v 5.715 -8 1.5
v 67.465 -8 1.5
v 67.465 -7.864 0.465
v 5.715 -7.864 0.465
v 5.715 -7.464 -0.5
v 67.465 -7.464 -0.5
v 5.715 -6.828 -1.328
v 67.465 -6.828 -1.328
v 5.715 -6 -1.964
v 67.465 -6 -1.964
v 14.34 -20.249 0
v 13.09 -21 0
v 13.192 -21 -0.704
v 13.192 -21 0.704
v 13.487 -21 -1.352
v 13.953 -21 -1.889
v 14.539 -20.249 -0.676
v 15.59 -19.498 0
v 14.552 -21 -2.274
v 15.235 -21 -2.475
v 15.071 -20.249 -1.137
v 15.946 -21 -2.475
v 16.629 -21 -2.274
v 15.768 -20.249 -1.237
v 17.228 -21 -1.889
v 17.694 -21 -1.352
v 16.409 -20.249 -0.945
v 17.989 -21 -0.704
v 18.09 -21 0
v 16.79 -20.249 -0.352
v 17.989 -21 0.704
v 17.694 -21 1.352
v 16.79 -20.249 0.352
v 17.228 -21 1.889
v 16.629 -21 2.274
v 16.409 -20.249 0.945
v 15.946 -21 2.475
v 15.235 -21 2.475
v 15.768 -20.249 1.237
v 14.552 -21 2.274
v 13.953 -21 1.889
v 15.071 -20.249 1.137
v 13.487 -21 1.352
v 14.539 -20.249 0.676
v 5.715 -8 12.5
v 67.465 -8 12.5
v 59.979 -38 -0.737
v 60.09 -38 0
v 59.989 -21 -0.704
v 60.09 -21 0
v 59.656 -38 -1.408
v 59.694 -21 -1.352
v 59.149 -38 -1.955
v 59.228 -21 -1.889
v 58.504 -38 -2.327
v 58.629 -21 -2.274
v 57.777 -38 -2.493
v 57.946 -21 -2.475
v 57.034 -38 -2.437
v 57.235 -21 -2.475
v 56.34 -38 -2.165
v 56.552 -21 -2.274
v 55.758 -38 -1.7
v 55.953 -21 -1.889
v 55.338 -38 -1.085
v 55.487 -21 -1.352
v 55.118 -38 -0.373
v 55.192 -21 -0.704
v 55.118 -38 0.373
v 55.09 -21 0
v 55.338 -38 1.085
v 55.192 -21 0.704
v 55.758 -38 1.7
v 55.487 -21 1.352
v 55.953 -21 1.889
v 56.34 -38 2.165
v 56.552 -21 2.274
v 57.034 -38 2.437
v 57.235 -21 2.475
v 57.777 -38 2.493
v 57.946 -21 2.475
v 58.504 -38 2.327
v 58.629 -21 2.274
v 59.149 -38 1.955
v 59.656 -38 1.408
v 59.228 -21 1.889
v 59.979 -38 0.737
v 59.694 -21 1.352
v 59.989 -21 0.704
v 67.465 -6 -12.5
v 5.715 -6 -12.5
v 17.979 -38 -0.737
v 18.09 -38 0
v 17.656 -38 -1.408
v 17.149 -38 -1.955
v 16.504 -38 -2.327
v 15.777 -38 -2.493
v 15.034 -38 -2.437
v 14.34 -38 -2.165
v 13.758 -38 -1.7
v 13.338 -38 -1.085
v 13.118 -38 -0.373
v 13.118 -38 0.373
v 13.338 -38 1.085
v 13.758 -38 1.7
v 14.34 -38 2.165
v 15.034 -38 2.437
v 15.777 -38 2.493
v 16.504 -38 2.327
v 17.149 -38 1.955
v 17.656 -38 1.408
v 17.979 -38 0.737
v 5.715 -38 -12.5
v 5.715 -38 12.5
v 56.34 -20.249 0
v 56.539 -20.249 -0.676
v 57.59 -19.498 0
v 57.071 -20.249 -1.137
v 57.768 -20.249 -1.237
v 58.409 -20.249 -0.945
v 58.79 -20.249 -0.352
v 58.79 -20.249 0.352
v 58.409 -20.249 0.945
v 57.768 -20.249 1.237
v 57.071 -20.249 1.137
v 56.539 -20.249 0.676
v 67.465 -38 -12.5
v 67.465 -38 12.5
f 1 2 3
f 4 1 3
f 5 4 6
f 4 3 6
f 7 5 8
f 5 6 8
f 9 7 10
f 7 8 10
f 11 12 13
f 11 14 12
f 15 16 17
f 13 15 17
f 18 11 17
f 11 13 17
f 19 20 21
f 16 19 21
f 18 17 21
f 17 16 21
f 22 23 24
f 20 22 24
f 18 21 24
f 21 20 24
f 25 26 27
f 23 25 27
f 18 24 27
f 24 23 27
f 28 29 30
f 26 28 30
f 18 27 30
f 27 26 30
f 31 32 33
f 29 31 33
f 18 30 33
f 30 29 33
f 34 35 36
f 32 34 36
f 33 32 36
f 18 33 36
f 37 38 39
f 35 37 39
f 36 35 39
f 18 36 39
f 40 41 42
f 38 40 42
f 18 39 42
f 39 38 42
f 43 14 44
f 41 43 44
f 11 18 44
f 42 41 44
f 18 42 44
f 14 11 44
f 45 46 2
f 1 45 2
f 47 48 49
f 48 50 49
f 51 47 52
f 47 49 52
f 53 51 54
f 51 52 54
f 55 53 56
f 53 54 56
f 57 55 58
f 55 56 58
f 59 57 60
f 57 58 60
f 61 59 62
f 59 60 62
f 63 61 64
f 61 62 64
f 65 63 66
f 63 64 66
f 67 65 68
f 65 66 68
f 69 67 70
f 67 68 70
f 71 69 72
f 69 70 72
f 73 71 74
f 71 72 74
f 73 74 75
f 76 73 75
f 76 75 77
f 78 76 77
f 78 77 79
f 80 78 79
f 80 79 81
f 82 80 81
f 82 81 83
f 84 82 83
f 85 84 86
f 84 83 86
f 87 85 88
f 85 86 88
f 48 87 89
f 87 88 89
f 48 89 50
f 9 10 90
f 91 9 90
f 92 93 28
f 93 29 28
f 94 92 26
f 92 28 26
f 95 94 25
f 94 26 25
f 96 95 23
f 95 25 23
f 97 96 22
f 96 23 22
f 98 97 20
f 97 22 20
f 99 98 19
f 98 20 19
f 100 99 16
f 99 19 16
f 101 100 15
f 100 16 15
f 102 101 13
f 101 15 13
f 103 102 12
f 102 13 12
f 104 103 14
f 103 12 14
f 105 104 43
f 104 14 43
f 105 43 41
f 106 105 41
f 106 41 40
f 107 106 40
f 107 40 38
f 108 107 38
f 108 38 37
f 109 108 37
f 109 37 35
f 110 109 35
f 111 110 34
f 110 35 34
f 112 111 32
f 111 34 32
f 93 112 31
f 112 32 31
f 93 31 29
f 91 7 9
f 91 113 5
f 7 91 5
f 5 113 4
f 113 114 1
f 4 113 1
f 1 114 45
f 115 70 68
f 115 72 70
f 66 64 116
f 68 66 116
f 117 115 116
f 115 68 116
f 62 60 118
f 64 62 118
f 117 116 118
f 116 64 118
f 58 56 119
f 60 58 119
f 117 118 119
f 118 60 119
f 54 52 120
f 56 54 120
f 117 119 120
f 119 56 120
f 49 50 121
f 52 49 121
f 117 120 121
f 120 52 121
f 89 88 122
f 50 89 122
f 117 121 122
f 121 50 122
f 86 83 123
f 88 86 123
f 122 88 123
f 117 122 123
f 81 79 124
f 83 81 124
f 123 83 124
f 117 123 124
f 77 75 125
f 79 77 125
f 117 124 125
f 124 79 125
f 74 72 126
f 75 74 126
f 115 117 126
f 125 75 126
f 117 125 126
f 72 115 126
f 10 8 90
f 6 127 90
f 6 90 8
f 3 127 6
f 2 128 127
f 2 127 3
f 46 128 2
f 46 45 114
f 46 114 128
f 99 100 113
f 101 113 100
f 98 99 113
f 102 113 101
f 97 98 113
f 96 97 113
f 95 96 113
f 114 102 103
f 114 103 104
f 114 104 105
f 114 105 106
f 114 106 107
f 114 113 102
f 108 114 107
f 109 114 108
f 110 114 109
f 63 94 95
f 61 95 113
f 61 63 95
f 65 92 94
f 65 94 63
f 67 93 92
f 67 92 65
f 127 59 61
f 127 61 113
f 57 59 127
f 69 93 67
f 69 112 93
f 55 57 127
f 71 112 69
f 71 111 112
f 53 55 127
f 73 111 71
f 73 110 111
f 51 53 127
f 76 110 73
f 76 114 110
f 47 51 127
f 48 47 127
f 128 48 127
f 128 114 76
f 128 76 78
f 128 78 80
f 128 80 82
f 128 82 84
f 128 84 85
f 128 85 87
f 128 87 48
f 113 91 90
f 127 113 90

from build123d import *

# Parameters (mm, degrees)
SKETCH1_W             = 61.75
SKETCH1_H             = 38
BOSS_EXTRUDE1_DEPTH   = 12.5
CUT_EXTRUDE1_REACH    = 75.575
M6_TAPPED_HOLE1_D     = 5
M6_TAPPED_HOLE1_DEPTH = 17
M6_TAPPED_HOLE1_TIP   = 1.502151548


with BuildPart() as part:
    # Sketch1 → Boss-Extrude1 (new, symmetric)
    with BuildSketch(Plane.XY):
        with Locations((36.590437788, -19)):
            Rectangle(SKETCH1_W, SKETCH1_H)
    extrude(amount=BOSS_EXTRUDE1_DEPTH, both=True)

    # Sketch2 → Cut-Extrude1 (cut, up to next)
    with BuildSketch(Plane(origin=(67.465437788, 0, 0), x_dir=(0, 0, -1), z_dir=(1, 0, 0)), mode=Mode.PRIVATE) as cut_extrude1_sk1:
        with BuildLine():
            Line((1.964101615, -6), (12.5, -6))
            Line((12.5, -6), (12.5, 0))
            Line((12.5, 0), (-12.5, 0))
            Line((-12.5, 0), (-12.5, -8))
            Line((-12.5, -8), (-1.5, -8))
            ThreePointArc((-1.5, -8), (0.5, -7.464101615), (1.964101615, -6))
        make_face()
    cut_extrude1_tool1 = extrude(cut_extrude1_sk1.sketch, amount=-CUT_EXTRUDE1_REACH, mode=Mode.PRIVATE) & part.part
    add(cut_extrude1_tool1.solids().sort_by_distance((67.465438, -3.603515, 0.874459))[0], mode=Mode.SUBTRACT)

    # M6 Tapped Hole1
    with Locations(Plane(origin=(0, -38, 0), x_dir=(-1, 0, 0), z_dir=(0, -1, 0))):
        with Locations((-15.590437788, 0), (-57.590437788, 0)):
            Hole(M6_TAPPED_HOLE1_D / 2, depth=M6_TAPPED_HOLE1_DEPTH)
            with Locations((0, 0, -(M6_TAPPED_HOLE1_DEPTH + M6_TAPPED_HOLE1_TIP / 2))):  # 118° drill point
                Cone(0, M6_TAPPED_HOLE1_D / 2, M6_TAPPED_HOLE1_TIP, mode=Mode.SUBTRACT)


solid = part.part
